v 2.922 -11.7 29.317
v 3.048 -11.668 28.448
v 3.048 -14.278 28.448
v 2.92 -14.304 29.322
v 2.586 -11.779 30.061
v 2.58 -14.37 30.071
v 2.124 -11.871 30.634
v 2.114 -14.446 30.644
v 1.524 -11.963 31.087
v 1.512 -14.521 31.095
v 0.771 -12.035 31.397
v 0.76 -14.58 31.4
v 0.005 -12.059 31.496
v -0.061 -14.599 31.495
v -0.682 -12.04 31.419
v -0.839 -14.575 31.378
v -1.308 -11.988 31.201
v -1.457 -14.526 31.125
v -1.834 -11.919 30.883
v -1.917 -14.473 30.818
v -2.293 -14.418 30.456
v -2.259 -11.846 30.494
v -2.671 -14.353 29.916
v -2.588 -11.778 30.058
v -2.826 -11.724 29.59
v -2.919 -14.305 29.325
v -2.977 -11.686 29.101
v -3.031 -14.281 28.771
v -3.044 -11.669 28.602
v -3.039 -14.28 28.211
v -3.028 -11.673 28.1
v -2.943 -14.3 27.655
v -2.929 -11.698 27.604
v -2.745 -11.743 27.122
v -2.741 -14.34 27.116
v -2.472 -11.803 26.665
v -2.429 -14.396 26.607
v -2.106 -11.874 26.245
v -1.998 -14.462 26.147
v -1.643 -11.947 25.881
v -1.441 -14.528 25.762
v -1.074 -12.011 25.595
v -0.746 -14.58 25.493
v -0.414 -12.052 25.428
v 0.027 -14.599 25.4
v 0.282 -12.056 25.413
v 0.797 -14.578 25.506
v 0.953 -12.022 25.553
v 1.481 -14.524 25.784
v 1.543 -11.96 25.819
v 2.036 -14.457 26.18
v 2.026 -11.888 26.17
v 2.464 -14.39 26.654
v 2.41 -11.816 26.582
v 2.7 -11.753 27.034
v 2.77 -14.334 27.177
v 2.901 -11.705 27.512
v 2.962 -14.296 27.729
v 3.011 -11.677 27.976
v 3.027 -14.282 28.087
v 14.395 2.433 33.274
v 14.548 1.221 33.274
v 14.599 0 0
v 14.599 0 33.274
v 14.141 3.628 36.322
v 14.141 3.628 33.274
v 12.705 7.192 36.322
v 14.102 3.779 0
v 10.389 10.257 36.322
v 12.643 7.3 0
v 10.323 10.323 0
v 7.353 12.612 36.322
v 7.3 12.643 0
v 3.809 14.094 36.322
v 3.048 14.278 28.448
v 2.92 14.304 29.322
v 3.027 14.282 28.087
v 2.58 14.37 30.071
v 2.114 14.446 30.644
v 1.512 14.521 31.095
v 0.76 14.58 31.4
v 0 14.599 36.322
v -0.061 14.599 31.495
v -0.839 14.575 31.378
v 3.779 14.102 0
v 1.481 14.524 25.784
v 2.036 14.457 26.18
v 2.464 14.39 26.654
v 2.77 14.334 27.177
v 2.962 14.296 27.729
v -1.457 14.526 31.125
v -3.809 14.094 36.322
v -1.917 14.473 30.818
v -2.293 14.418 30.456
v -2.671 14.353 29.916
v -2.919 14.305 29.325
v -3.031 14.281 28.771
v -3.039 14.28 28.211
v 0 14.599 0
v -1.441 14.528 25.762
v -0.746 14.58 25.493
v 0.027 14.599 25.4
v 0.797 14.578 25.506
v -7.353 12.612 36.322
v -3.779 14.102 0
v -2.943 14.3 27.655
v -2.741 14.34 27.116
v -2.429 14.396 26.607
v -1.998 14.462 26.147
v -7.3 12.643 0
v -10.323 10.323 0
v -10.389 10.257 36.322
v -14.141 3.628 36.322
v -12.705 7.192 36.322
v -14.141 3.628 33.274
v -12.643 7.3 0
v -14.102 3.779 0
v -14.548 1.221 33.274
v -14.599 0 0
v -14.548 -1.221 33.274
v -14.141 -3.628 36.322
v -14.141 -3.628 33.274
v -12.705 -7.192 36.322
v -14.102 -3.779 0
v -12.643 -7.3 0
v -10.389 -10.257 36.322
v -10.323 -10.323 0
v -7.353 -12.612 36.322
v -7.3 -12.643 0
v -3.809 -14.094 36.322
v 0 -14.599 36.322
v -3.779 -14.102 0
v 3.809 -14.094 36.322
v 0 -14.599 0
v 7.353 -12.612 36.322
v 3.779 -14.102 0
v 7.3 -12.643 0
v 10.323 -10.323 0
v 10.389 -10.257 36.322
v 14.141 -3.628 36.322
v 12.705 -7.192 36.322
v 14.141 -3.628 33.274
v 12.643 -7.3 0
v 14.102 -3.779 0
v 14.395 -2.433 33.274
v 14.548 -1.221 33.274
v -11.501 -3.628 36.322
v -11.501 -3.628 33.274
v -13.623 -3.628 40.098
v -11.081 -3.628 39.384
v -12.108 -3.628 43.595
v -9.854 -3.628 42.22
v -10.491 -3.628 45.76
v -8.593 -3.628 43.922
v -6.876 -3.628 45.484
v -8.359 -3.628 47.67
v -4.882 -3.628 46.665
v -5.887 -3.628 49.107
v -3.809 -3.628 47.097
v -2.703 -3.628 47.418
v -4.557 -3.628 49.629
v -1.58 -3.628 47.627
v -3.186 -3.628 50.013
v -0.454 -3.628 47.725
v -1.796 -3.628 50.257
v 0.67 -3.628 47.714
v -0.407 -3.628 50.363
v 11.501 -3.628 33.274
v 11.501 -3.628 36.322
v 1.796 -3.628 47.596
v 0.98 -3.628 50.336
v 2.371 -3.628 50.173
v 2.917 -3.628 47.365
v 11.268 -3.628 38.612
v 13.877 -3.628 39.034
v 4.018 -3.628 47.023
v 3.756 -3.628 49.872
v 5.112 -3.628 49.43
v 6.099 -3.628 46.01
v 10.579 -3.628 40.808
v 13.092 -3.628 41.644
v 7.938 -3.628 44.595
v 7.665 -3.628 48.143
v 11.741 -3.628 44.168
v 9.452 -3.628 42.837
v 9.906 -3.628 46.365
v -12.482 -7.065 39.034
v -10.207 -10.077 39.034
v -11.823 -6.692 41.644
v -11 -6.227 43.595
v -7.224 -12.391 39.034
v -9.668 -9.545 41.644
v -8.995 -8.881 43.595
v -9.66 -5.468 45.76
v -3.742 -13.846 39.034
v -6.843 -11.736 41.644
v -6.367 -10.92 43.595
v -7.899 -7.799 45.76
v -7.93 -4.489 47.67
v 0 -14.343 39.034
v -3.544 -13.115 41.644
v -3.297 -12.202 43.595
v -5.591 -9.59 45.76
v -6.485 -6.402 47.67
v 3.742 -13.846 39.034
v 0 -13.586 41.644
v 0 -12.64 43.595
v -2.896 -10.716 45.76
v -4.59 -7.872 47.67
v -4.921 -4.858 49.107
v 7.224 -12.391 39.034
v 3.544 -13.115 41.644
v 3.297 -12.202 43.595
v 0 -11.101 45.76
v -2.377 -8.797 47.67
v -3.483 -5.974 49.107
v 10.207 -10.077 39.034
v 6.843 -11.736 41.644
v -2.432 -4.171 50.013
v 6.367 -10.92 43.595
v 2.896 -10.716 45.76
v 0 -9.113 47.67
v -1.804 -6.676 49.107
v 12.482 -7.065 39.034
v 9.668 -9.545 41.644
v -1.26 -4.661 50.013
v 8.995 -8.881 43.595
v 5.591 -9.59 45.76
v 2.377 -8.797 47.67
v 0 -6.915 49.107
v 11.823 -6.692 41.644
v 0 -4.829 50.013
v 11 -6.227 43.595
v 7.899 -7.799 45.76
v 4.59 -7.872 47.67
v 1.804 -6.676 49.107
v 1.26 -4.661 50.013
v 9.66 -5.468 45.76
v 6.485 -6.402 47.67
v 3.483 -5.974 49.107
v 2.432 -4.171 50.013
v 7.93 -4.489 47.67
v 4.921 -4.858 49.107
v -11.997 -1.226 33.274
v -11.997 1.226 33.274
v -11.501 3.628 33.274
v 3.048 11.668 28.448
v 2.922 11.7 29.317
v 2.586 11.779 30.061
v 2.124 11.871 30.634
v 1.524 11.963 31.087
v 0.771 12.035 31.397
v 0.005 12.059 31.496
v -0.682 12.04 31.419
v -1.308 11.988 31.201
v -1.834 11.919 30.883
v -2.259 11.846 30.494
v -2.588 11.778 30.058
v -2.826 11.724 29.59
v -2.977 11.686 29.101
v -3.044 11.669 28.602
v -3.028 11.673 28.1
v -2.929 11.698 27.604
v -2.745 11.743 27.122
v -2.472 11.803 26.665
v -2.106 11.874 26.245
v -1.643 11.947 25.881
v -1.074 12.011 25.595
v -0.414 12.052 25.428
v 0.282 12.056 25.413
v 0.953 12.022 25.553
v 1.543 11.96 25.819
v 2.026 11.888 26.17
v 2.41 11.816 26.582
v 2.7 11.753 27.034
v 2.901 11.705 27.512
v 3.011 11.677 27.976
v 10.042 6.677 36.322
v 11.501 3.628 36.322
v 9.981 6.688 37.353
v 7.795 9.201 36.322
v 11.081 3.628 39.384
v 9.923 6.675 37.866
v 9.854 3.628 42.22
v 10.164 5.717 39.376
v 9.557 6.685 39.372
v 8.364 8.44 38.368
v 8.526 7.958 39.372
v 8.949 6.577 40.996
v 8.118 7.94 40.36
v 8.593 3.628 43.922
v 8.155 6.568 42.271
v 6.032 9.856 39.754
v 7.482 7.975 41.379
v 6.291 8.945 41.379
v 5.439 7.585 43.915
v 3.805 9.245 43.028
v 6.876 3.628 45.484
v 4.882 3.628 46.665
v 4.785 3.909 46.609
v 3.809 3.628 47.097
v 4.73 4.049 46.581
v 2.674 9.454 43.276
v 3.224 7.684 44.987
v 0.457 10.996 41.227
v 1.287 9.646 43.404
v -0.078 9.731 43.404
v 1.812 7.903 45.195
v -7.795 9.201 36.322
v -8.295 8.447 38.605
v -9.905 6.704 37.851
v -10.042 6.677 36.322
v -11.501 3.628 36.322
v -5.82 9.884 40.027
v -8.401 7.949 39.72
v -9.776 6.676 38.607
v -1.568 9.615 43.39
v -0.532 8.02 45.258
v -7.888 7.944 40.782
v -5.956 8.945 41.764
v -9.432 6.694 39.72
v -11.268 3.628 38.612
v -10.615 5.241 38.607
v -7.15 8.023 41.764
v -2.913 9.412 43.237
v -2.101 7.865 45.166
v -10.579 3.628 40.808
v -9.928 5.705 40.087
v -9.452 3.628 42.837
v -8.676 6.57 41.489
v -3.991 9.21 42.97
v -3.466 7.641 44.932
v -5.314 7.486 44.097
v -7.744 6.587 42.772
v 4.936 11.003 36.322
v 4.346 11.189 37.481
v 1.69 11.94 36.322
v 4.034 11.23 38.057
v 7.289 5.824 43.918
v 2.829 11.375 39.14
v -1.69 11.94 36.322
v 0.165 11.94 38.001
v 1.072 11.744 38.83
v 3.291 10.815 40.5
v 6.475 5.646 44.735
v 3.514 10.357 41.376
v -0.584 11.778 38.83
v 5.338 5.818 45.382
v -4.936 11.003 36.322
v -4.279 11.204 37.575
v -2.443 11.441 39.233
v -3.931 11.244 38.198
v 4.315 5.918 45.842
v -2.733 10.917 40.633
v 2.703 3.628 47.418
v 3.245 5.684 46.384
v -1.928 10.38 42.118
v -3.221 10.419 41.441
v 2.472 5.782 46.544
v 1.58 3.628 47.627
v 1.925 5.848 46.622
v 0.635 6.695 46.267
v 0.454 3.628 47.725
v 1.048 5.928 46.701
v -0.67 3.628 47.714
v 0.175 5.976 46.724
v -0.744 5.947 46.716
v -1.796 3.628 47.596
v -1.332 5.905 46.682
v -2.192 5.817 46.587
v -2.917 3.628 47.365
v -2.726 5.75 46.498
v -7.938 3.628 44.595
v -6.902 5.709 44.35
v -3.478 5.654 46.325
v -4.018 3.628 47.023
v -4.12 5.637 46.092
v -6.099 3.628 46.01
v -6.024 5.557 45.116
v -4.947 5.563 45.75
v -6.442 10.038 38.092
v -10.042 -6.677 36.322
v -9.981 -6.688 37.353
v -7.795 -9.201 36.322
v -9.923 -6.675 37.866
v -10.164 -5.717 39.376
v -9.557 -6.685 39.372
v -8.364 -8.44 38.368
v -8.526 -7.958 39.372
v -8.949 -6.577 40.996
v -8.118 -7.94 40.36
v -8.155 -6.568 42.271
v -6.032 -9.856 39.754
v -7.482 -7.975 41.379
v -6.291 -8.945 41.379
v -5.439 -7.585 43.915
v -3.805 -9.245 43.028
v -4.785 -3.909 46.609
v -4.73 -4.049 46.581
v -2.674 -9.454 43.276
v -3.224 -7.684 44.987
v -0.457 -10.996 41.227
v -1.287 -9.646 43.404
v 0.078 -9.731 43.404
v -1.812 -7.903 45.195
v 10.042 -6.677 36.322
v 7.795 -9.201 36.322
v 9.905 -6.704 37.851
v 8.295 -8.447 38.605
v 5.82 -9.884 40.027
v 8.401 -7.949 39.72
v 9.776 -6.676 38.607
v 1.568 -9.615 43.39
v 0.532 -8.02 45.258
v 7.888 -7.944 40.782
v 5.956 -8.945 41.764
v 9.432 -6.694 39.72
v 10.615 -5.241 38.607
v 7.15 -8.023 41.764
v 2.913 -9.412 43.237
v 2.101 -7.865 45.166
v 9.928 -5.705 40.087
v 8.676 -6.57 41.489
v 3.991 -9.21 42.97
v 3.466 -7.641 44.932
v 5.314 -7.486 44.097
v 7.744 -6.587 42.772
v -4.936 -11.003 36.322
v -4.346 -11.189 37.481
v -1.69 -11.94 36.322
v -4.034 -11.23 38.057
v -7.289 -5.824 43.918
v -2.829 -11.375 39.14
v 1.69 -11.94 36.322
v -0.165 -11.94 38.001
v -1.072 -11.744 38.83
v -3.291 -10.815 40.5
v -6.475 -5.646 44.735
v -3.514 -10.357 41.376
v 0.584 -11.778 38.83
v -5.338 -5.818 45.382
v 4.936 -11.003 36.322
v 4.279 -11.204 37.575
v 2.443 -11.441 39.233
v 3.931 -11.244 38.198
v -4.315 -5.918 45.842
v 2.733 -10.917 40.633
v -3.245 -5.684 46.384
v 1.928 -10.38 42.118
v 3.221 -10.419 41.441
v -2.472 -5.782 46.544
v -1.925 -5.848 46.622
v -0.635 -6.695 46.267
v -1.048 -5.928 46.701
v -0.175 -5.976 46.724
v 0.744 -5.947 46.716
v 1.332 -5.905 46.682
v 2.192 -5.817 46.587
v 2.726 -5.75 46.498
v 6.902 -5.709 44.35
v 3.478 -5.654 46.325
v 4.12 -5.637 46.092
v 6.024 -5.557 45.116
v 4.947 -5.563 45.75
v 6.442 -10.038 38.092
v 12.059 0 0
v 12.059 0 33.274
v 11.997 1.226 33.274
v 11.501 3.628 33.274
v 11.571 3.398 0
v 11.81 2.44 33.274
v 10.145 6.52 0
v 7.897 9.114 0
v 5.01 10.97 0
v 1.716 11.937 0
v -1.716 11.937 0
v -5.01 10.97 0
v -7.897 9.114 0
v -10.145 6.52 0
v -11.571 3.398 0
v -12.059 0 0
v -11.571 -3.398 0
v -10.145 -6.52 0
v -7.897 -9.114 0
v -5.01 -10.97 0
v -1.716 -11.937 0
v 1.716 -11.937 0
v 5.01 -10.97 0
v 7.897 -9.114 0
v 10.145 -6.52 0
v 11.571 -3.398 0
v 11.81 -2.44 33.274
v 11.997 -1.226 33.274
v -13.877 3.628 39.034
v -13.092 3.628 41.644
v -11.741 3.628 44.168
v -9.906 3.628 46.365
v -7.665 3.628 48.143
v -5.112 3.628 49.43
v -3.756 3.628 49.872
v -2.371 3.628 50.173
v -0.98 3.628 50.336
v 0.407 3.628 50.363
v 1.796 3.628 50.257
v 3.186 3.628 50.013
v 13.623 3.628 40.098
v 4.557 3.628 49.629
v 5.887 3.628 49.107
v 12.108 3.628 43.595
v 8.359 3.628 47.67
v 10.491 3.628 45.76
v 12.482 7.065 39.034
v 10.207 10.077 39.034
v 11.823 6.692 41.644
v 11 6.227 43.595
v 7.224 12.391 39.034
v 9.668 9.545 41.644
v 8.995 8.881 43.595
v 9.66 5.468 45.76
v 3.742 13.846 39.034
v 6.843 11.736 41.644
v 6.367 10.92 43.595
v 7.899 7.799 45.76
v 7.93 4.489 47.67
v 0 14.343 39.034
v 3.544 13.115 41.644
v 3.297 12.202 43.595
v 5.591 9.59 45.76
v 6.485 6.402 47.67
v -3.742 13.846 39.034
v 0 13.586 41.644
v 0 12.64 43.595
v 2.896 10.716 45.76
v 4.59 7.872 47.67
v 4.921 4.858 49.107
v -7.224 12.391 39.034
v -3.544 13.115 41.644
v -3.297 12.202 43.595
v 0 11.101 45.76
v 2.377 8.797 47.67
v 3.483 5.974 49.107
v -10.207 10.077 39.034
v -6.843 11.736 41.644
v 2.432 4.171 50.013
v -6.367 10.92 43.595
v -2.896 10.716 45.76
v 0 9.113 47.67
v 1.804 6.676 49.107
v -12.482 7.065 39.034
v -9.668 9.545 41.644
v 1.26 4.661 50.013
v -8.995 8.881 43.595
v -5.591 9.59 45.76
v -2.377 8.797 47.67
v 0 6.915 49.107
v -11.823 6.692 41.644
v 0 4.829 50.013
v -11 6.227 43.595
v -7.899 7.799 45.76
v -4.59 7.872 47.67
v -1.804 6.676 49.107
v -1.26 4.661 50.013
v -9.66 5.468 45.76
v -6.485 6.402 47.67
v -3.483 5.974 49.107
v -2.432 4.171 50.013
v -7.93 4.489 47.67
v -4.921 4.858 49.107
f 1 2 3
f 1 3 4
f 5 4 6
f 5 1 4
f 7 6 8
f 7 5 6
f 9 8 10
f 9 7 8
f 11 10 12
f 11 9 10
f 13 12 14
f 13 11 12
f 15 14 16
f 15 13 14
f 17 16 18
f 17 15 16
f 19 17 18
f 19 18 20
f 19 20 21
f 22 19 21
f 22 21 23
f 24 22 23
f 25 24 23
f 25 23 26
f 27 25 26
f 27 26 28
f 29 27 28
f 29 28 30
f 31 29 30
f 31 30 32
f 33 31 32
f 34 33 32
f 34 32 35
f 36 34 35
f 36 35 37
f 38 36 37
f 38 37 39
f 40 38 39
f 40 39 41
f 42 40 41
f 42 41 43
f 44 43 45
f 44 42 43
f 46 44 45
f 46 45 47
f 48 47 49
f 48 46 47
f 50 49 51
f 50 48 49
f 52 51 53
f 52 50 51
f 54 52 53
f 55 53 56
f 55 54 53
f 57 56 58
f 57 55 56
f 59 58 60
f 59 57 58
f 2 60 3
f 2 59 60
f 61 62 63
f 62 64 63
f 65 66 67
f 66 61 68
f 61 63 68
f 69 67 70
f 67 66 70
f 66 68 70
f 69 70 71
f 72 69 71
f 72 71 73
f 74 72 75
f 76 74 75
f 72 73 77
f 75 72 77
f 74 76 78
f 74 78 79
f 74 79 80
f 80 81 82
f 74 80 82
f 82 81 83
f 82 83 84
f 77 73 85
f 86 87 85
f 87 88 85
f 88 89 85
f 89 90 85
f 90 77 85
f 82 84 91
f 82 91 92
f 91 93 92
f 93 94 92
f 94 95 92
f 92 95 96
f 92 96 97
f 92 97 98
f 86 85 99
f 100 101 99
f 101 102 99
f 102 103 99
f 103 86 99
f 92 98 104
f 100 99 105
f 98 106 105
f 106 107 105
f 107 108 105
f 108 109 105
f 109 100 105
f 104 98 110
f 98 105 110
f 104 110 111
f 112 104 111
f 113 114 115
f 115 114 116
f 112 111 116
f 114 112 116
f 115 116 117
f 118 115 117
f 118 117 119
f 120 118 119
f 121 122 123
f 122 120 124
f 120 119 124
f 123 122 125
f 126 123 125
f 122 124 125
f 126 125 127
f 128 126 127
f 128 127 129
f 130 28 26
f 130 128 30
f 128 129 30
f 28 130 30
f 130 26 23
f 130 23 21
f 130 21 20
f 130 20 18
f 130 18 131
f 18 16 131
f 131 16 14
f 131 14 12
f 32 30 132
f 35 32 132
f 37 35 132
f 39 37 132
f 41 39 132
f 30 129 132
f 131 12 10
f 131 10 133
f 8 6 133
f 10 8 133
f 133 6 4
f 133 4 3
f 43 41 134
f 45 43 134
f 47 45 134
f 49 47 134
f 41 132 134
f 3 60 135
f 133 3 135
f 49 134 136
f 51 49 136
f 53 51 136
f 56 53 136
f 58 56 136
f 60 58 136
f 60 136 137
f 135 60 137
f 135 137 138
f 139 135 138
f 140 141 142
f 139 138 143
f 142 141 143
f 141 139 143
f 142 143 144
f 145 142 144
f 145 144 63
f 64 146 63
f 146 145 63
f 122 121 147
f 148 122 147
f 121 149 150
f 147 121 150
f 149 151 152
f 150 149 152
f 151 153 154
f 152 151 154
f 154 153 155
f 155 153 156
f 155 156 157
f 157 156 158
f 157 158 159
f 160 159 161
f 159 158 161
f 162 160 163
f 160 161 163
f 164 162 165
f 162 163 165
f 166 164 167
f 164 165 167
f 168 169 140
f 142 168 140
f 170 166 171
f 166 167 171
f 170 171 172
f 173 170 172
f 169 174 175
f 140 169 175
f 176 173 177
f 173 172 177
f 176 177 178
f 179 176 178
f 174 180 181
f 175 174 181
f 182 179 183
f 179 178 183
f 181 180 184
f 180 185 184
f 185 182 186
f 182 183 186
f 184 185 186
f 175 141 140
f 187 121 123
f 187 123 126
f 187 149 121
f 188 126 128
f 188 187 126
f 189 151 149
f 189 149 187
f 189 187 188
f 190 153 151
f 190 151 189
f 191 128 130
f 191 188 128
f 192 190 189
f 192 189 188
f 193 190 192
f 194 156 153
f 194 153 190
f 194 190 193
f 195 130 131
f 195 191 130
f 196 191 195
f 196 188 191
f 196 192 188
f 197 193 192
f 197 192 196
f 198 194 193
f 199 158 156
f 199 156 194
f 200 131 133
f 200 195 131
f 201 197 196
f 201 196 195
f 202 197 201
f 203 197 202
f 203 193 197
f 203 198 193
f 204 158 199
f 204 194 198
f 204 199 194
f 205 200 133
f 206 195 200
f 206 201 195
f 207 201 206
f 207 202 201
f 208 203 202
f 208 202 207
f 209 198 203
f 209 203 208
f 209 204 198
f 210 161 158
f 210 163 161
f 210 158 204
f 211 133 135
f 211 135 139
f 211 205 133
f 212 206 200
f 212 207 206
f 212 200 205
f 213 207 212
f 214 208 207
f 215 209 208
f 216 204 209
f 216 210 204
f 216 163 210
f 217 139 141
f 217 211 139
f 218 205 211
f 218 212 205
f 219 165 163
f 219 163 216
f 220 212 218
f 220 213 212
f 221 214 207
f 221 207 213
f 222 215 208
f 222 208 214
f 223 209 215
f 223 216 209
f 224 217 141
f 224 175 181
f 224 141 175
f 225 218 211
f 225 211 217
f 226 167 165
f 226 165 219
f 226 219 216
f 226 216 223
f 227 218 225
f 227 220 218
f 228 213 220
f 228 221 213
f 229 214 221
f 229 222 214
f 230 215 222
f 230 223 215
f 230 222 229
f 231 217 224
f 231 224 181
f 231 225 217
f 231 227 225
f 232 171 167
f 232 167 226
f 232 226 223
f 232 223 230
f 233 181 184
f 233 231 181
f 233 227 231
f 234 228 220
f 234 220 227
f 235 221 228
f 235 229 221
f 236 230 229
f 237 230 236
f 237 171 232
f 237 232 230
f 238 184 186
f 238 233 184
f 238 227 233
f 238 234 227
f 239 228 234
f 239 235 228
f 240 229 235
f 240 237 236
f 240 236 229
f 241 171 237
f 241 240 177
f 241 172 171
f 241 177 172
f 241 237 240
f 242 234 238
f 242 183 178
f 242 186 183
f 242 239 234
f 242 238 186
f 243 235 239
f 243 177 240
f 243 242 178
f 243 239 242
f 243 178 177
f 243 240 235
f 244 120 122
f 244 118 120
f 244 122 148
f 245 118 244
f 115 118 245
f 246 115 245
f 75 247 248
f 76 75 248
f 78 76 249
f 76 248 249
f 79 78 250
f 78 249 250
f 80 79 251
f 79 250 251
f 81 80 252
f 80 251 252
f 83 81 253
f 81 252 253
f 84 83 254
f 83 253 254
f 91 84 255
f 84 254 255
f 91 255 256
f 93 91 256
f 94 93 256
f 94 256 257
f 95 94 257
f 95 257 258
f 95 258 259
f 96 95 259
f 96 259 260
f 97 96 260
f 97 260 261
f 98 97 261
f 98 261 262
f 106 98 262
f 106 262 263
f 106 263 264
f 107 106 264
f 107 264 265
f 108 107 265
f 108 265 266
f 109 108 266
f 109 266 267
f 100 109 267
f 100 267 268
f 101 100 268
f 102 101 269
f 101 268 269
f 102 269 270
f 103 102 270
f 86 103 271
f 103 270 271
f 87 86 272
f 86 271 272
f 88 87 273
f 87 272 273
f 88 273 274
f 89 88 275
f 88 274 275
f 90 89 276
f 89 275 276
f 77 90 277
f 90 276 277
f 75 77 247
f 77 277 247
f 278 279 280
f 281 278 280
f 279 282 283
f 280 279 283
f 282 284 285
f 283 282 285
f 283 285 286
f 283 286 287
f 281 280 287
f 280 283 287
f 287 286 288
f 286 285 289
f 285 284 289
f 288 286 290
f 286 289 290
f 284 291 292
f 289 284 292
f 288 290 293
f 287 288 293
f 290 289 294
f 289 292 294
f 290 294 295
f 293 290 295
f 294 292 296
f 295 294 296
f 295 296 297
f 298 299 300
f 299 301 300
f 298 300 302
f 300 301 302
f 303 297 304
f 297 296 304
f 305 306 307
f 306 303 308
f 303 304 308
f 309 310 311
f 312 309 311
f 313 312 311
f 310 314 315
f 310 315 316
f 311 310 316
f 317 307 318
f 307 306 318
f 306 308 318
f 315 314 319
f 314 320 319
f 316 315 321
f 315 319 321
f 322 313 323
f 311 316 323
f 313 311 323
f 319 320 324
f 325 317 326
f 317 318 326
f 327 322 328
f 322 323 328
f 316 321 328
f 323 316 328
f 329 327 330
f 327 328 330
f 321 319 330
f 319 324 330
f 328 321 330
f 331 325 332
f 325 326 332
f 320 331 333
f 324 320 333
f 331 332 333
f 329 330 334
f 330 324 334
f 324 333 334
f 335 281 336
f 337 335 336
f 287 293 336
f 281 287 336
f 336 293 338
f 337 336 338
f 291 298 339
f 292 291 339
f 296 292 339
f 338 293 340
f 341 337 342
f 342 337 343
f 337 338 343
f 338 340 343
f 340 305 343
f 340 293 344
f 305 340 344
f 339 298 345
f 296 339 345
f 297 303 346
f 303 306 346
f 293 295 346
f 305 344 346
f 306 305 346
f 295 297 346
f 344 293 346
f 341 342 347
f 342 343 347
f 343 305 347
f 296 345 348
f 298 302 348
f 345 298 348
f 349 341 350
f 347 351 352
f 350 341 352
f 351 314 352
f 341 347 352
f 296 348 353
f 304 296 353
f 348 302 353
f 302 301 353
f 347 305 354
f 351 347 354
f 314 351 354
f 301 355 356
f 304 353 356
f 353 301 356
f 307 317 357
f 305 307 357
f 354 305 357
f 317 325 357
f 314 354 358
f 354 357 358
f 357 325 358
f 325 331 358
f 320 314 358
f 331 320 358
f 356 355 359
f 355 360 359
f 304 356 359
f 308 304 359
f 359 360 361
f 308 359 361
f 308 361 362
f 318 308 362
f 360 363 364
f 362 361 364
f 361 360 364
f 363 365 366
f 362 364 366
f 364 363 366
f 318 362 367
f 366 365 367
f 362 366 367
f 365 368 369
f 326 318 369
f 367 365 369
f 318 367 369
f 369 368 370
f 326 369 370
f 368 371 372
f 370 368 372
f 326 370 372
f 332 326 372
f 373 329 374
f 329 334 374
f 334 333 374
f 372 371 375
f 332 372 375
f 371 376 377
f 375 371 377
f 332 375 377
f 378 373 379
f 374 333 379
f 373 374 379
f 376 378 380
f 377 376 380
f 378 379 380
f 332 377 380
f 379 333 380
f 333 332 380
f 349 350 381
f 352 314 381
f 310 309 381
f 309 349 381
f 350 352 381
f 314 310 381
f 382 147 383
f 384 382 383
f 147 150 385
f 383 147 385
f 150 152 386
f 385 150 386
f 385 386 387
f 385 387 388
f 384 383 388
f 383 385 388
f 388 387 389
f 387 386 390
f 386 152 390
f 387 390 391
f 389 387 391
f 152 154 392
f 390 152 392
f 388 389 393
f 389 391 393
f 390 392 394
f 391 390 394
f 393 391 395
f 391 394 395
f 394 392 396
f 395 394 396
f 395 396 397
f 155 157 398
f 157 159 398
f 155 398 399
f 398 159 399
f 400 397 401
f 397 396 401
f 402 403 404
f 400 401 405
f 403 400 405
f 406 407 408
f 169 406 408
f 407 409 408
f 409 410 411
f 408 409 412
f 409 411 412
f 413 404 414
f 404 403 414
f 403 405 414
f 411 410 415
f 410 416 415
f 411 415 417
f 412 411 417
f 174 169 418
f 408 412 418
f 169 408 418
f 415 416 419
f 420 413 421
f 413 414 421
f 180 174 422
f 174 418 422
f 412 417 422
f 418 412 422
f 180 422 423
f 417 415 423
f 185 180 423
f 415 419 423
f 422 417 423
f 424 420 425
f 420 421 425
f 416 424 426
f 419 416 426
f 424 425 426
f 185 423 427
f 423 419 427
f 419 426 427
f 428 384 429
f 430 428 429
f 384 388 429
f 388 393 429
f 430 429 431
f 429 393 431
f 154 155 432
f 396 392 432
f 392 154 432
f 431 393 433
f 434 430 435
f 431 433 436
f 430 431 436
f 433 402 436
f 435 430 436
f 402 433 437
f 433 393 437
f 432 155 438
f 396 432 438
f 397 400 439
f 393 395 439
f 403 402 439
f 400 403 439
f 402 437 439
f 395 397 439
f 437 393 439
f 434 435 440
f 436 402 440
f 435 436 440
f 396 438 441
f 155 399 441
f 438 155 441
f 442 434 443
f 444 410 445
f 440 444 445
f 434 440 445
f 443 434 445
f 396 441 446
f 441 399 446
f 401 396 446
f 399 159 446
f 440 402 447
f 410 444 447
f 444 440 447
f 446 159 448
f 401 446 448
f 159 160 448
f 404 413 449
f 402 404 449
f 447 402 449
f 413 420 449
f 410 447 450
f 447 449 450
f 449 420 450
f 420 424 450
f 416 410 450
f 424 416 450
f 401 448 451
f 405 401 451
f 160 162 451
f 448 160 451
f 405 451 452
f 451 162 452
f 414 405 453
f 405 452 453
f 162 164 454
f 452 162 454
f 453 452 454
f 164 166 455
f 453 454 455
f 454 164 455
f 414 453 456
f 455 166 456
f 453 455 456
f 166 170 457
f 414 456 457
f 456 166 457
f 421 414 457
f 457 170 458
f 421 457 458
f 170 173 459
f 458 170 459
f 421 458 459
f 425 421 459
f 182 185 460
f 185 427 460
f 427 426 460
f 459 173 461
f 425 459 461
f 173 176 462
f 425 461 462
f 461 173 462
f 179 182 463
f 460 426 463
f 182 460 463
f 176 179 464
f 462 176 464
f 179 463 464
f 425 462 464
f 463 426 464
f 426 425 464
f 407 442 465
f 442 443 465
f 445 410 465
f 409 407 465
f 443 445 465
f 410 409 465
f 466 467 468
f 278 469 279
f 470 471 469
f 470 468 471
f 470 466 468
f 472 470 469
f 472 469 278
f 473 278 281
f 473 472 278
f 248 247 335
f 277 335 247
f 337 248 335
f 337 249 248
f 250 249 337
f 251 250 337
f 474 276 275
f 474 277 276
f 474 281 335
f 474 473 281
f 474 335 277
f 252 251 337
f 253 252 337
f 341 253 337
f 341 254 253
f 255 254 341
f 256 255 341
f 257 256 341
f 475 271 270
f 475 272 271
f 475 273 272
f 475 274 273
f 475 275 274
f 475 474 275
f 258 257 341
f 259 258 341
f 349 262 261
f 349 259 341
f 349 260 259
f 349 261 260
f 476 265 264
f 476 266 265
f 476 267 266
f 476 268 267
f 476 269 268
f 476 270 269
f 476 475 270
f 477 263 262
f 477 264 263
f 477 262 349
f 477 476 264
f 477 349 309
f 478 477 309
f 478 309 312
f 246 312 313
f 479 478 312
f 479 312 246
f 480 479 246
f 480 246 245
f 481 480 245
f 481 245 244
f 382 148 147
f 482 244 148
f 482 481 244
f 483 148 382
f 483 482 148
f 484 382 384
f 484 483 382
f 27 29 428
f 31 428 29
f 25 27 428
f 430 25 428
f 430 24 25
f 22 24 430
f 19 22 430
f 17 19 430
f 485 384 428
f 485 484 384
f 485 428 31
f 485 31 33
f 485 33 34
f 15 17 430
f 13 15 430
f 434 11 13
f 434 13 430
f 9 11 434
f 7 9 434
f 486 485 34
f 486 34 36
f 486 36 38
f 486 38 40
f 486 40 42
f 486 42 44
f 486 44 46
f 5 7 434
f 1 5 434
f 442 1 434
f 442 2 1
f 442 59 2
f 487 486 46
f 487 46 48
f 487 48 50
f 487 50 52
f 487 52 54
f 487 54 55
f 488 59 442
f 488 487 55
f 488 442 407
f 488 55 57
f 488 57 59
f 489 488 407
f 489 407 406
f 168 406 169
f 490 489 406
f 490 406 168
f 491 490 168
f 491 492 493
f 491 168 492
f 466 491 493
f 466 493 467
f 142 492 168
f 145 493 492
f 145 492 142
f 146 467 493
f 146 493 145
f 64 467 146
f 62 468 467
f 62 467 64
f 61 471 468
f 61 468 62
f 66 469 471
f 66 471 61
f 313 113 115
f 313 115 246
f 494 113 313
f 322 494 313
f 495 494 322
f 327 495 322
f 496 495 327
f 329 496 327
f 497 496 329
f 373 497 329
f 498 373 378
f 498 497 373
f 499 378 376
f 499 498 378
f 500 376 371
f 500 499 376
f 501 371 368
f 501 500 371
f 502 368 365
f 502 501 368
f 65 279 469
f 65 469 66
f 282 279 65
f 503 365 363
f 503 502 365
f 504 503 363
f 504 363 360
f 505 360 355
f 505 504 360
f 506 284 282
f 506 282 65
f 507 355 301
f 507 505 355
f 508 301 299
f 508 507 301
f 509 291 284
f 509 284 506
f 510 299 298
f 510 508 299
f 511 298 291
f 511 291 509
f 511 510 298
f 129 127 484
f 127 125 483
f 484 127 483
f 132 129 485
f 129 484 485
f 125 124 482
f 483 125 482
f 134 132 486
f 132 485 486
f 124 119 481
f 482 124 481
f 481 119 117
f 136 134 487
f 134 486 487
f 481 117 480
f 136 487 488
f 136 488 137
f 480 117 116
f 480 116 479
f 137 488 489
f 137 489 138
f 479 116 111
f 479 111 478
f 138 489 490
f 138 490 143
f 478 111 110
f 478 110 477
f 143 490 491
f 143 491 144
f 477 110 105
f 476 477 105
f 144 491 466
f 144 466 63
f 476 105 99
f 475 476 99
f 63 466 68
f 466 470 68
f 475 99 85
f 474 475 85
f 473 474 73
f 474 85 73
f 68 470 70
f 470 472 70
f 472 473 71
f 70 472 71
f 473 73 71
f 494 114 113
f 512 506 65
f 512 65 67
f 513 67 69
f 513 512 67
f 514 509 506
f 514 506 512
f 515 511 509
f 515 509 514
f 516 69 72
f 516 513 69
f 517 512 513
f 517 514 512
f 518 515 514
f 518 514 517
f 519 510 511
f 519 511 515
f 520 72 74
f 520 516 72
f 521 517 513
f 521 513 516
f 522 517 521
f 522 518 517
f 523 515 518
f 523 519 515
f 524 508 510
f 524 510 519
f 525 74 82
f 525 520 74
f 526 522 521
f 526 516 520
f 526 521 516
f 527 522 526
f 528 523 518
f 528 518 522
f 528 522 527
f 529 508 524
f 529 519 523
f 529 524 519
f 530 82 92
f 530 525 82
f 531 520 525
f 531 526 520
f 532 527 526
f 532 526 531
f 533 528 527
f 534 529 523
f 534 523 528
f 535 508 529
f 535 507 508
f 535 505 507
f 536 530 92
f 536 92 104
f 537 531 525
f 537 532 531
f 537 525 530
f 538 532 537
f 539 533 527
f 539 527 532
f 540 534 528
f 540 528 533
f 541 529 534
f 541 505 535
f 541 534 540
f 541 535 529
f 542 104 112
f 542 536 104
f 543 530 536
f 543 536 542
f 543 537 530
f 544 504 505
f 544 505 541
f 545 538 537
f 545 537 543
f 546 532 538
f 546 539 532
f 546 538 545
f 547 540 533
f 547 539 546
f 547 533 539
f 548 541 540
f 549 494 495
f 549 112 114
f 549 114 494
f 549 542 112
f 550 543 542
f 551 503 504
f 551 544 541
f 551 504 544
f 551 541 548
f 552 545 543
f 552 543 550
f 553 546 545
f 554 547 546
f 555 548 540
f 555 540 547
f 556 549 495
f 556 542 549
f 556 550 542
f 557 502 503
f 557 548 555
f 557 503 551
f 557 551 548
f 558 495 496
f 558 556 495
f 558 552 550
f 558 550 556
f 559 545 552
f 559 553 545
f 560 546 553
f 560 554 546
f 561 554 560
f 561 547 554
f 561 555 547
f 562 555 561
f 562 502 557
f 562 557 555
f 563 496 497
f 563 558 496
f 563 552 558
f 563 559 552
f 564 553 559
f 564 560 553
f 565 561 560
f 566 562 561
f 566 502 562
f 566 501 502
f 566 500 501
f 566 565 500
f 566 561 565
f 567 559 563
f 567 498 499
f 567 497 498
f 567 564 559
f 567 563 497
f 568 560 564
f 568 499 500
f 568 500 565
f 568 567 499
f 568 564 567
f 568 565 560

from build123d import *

# Parameters (mm, degrees)
F0_R      = 14.5993643937
F1_DEPTH  = 50.8
F2_R      = 14.478
F3_T      = -2.54
F4_W      = 31.7054085236
F4_H      = 7.25655691
F4_R      = 0.1213643937
F1_FACE_R = 0.1213643937
F3_FACE_R = 0.1213643937
F5_DEPTH  = 17.526
F6_R      = 3.048
F7_DEPTH  = 23.876
F8_R      = 3.048
F9_DEPTH  = 37.592


with BuildPart() as f1:
    # F0 (on Top) → F1 (new body)
    with BuildSketch(Plane.XY):
        Circle(F0_R)
    extrude(amount=F1_DEPTH)

    # F2
    f2_edges = [f1.edges().sort_by_distance(p)[0] for p in [
        (-14.599364, 0, 50.8),
    ]]
    fillet(f2_edges, radius=F2_R)

    # F3
    f3_openings = [f1.faces().sort_by_distance(p)[0] for p in [
        (0, 0, 0),
    ]]
    offset(amount=F3_T, openings=f3_openings)

    # F4 (on face) + F1_face (on face) + F3_face (on face) → F5 (cut)
    with BuildSketch(Plane.XY.offset(50.8)):
        Rectangle(F4_W, F4_H)
        Circle(F4_R, mode=Mode.SUBTRACT)
    with BuildSketch(Plane.XY.offset(50.8)):
        Circle(F1_FACE_R)
    with BuildSketch(Plane(origin=(0, 0, 48.26), x_dir=(1, 0, 0), z_dir=(0, 0, -1))):
        Circle(F3_FACE_R)
    extrude(amount=-F5_DEPTH, dir=(0, 0, 1), mode=Mode.SUBTRACT)

    # F6 (on Front) → F7 (cut)
    with BuildSketch(Plane.XZ):
        with Locations((0, 28.448)):
            Circle(F6_R)
    extrude(amount=-F7_DEPTH, mode=Mode.SUBTRACT)

    # F8 (on Front) → F9 (cut)
    with BuildSketch(Plane.XZ):
        with Locations((0, 28.448)):
            Circle(F8_R)
    extrude(amount=F9_DEPTH, mode=Mode.SUBTRACT)


solid = f1.part
